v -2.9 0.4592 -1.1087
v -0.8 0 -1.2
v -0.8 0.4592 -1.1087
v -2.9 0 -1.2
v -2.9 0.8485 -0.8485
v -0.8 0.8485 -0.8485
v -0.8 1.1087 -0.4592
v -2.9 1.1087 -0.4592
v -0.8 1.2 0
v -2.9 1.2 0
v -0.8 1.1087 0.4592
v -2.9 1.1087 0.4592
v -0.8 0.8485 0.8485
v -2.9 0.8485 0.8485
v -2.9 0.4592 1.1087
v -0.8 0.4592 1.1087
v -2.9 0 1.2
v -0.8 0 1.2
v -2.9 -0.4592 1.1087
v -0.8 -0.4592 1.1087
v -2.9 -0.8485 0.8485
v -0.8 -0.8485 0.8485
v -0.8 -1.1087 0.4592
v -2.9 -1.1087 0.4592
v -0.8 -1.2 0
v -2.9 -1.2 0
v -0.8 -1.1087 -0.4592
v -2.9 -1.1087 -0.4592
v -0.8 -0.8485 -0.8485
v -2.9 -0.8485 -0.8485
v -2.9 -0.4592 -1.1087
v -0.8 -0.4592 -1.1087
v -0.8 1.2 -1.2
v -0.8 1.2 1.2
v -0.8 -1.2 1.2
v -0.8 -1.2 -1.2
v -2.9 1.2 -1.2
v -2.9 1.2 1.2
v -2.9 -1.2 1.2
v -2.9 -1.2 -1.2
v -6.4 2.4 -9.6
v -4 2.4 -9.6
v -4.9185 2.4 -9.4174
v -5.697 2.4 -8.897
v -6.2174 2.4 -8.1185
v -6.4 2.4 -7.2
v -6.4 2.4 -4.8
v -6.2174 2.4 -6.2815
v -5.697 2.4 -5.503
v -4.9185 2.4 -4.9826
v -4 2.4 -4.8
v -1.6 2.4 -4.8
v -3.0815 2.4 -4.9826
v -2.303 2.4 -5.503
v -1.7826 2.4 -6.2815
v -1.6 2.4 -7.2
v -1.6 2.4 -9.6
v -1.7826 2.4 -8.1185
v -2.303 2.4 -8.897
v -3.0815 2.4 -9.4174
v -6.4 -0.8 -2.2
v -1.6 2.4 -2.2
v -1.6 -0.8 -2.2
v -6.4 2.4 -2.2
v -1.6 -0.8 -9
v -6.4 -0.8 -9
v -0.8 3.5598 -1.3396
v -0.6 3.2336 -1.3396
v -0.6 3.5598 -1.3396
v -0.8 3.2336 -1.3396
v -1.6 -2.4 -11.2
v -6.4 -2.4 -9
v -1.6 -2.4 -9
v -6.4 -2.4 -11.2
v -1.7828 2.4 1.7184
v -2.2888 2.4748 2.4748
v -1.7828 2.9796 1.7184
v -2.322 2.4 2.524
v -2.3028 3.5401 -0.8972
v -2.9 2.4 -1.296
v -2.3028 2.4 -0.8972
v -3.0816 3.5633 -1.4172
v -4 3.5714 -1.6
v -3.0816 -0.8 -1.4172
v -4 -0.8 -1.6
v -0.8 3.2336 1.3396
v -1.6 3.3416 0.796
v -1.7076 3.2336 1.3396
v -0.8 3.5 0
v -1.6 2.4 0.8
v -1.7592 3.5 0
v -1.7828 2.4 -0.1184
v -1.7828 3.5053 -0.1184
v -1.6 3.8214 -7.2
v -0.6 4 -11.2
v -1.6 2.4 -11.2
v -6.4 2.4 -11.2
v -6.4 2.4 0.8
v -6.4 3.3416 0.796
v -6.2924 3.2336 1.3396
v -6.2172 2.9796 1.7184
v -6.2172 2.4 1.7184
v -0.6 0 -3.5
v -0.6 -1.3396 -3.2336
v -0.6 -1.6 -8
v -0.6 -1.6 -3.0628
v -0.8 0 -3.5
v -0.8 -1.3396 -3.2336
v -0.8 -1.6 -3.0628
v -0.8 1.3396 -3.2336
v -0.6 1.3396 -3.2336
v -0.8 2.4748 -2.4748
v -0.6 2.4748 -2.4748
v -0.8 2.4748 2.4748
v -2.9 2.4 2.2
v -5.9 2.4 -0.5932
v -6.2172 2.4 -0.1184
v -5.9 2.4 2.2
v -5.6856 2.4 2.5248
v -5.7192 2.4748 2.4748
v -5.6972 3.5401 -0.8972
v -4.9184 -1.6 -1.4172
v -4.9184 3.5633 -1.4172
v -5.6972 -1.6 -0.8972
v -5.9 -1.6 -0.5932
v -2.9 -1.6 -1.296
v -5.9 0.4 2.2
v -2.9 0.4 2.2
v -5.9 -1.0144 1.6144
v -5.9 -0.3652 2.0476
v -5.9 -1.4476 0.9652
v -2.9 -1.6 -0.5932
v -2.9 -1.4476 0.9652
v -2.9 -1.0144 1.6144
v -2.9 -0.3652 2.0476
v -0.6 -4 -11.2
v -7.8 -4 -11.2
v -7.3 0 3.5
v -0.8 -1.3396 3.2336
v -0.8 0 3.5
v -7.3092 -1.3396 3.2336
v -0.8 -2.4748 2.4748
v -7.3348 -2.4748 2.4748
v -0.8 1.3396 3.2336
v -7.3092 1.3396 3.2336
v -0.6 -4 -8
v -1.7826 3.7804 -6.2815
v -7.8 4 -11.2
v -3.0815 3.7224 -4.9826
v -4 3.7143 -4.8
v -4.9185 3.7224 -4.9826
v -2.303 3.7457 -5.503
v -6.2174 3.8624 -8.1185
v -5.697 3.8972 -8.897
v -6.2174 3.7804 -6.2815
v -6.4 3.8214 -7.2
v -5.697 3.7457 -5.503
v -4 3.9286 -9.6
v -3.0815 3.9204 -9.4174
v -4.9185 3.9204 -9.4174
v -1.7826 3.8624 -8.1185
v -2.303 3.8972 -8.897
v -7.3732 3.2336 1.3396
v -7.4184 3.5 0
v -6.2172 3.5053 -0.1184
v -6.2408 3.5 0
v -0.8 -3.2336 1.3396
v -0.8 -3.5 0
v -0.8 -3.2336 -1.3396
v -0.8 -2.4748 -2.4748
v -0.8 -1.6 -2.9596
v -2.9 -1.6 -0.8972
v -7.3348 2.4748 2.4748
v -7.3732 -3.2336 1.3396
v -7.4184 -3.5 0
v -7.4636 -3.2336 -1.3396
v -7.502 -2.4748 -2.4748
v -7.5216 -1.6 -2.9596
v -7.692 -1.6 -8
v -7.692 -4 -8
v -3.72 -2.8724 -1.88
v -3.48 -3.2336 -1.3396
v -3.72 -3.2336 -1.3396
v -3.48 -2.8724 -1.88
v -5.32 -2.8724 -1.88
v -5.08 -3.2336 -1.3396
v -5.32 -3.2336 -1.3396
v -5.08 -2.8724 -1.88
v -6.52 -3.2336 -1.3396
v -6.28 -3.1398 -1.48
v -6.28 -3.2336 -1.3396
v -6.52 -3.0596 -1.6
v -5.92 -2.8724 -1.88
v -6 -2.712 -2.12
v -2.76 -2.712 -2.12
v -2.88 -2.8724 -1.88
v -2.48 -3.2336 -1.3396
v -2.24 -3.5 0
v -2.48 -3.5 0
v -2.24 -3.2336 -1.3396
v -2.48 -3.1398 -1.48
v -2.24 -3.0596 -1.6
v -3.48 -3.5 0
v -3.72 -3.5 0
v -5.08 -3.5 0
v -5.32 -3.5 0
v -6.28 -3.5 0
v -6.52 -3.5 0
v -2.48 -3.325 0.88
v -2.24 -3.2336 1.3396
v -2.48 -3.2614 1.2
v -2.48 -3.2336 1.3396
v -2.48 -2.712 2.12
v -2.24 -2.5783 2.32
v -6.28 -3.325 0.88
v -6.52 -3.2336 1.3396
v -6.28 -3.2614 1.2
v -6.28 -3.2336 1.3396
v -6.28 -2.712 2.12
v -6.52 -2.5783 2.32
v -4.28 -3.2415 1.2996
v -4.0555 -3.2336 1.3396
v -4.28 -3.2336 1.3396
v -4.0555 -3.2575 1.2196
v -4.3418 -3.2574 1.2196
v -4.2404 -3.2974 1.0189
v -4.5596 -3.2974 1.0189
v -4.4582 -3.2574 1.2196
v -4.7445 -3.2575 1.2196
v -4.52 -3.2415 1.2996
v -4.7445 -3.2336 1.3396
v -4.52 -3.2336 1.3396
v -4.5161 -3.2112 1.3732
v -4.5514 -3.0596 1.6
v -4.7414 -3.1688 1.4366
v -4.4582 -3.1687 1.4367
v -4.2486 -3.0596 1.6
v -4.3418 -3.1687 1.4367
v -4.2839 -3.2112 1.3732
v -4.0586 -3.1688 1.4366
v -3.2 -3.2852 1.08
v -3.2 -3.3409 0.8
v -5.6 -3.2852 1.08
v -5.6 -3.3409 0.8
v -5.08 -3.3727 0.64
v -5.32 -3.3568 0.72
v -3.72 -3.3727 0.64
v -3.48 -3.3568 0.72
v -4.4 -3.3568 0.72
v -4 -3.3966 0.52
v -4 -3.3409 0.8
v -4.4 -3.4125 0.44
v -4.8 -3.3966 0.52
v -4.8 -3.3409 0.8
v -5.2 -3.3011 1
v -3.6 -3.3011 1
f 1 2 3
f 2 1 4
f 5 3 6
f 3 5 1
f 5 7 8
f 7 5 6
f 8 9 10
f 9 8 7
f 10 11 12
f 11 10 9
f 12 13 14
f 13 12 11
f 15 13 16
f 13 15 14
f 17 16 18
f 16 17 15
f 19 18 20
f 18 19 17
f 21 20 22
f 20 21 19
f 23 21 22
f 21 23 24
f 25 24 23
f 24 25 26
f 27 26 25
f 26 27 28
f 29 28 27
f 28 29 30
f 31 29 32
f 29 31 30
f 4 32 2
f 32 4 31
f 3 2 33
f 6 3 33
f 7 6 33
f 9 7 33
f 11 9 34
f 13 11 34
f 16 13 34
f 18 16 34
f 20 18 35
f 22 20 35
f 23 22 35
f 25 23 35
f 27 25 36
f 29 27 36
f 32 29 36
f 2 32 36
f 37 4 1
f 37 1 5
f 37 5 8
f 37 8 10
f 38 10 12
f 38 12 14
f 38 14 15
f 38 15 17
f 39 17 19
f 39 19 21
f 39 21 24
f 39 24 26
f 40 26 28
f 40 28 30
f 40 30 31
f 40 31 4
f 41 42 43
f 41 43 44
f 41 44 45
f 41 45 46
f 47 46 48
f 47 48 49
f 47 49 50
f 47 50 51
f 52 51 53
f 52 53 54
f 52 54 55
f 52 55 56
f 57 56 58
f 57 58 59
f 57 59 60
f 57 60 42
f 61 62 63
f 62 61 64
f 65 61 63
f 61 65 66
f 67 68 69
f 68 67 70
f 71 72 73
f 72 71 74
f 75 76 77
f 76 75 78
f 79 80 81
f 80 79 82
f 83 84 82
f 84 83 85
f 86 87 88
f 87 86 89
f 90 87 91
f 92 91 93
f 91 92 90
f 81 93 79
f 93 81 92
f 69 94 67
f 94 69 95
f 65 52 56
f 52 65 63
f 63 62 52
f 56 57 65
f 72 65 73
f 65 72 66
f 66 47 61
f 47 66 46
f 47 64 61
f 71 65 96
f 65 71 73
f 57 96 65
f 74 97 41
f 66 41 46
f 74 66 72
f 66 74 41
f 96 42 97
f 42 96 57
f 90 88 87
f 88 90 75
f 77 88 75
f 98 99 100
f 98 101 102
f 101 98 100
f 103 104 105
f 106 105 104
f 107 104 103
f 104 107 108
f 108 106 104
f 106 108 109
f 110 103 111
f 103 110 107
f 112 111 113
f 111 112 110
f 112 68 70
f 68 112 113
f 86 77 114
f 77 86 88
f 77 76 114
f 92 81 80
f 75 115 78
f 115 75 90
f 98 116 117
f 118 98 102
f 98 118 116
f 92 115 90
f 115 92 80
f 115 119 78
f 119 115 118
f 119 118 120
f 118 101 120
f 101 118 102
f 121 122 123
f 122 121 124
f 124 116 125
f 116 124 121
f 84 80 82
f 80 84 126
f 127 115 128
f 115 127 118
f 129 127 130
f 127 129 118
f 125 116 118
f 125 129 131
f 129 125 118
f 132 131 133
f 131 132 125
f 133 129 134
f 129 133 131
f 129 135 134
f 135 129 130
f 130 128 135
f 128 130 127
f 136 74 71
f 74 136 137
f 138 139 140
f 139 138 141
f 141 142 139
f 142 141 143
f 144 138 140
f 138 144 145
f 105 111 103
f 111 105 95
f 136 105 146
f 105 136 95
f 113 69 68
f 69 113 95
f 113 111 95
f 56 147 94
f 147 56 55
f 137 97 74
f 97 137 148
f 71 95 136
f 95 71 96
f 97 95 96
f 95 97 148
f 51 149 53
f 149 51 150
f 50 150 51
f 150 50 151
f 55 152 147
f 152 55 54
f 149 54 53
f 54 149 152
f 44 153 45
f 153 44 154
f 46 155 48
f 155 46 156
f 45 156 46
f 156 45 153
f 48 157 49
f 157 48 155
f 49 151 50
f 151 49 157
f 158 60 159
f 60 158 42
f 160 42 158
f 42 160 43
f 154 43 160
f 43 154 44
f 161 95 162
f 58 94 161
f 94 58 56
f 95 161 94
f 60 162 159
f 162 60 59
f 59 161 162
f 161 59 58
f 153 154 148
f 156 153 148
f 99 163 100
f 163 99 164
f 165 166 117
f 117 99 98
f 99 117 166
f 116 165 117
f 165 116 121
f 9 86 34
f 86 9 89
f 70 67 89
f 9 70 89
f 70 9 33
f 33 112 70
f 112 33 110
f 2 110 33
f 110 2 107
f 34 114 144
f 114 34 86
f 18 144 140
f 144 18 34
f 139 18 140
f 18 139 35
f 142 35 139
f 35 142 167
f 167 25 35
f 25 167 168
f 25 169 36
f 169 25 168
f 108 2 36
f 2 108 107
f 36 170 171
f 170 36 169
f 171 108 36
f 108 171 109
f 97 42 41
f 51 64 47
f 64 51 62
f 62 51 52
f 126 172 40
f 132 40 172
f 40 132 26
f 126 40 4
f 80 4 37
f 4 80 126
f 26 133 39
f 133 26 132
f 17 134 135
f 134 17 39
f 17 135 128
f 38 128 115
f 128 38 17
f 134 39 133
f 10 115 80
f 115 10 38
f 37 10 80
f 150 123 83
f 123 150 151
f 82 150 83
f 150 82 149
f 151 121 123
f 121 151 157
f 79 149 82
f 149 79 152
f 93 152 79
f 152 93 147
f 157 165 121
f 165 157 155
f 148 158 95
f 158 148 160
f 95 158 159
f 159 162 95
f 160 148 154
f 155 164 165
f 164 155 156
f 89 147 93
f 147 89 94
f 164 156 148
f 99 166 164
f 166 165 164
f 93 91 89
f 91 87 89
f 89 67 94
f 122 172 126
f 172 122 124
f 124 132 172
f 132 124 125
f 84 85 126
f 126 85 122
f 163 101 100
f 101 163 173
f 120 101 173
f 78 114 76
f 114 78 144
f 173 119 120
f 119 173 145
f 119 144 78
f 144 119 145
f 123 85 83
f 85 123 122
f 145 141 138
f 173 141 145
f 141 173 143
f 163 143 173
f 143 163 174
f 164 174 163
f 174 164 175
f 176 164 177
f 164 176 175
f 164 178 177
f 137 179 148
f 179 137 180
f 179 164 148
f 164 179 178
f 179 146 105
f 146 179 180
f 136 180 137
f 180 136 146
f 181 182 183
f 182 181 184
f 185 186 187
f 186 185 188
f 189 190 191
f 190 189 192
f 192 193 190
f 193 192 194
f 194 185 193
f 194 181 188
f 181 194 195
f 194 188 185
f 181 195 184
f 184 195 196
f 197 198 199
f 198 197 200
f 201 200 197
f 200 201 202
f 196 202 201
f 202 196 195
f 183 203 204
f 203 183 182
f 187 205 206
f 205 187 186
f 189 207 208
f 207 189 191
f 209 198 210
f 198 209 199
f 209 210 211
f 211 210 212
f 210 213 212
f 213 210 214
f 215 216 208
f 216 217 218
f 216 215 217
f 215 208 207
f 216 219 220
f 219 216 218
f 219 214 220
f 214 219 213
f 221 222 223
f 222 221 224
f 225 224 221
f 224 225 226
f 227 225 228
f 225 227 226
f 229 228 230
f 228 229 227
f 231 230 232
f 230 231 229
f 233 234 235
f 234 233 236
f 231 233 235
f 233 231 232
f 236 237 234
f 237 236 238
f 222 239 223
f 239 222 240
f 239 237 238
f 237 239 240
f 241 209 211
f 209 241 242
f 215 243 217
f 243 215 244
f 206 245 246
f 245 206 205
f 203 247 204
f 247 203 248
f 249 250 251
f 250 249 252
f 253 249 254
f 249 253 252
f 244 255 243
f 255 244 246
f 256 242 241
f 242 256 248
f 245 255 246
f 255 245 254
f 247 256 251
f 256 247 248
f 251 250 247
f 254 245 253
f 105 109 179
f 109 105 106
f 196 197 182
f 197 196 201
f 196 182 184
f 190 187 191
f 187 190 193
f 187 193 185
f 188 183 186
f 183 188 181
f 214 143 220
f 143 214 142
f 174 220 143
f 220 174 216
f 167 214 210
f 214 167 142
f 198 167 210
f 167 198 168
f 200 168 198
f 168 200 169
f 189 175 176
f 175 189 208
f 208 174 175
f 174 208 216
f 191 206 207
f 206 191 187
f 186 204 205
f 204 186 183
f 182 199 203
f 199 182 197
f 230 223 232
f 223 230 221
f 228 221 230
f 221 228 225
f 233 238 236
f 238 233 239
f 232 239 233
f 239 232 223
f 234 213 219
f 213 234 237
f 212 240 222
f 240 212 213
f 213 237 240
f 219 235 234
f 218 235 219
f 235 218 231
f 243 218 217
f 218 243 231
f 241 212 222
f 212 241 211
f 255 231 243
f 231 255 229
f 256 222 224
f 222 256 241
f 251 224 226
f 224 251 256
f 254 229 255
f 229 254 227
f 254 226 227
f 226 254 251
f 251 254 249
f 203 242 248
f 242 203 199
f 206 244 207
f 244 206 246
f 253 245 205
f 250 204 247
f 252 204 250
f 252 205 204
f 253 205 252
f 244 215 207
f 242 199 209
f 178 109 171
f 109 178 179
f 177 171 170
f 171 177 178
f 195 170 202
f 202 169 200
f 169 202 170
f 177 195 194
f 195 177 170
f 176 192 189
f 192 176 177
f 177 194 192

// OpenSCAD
use <../lib.scad>
use <3817bpa3.scad>
$fa=1; $fs=0.2;
function ldraw_lib__3816bpa3(realsolid=false) = [
// 0 Minifig Leg Right with Buttoned Cargo Pocket Pattern
// 0 Name: 3816bpa3.dat
// 0 Author: Andy Westrate [westrate]
// 0 !LDRAW_ORG Part UPDATE 2020-03
// 0 !LICENSE Licensed under CC BY 2.0 and CC BY 4.0 : see CAreadme.txt
// 
// 0 BFC CERTIFY CCW
  [0,"BFC","CERTIFY"],
  [0,"BFC","CCW"],
// 
// 0 !KEYWORDS Bricklink 970c00pb0018, Johnny Thunder
// 
// 0 !CMDLINE -c19
// 
// 0 !HISTORY 2009-12-29 [westrate] Original design as 3816pa3
// 0 !HISTORY 2020-06-27 [MagFors] Adapted to corrected geometry
// 0 !HISTORY 2020-12-29 [PTadmin] Official Update 2020-03
// 
// 
// 1 16 0 0 0 -1 0 0 0 1 0 0 0 1 3817bpa3.dat
  [1,16,0,0,0,-1,0,0,0,1,0,0,0,1, ldraw_lib__3817bpa3(realsolid)],
];
module ldraw_lib__3816bpa3(step=0, col=false, unit=2/5, alt=false, line=0.2, solid=!$preview)
    makepoly(ldraw_lib__3816bpa3(solid), step=step, col=col, unit=unit, alt=alt, line=line, solid=solid);
ldraw_lib__3816bpa3(line=0.2);
